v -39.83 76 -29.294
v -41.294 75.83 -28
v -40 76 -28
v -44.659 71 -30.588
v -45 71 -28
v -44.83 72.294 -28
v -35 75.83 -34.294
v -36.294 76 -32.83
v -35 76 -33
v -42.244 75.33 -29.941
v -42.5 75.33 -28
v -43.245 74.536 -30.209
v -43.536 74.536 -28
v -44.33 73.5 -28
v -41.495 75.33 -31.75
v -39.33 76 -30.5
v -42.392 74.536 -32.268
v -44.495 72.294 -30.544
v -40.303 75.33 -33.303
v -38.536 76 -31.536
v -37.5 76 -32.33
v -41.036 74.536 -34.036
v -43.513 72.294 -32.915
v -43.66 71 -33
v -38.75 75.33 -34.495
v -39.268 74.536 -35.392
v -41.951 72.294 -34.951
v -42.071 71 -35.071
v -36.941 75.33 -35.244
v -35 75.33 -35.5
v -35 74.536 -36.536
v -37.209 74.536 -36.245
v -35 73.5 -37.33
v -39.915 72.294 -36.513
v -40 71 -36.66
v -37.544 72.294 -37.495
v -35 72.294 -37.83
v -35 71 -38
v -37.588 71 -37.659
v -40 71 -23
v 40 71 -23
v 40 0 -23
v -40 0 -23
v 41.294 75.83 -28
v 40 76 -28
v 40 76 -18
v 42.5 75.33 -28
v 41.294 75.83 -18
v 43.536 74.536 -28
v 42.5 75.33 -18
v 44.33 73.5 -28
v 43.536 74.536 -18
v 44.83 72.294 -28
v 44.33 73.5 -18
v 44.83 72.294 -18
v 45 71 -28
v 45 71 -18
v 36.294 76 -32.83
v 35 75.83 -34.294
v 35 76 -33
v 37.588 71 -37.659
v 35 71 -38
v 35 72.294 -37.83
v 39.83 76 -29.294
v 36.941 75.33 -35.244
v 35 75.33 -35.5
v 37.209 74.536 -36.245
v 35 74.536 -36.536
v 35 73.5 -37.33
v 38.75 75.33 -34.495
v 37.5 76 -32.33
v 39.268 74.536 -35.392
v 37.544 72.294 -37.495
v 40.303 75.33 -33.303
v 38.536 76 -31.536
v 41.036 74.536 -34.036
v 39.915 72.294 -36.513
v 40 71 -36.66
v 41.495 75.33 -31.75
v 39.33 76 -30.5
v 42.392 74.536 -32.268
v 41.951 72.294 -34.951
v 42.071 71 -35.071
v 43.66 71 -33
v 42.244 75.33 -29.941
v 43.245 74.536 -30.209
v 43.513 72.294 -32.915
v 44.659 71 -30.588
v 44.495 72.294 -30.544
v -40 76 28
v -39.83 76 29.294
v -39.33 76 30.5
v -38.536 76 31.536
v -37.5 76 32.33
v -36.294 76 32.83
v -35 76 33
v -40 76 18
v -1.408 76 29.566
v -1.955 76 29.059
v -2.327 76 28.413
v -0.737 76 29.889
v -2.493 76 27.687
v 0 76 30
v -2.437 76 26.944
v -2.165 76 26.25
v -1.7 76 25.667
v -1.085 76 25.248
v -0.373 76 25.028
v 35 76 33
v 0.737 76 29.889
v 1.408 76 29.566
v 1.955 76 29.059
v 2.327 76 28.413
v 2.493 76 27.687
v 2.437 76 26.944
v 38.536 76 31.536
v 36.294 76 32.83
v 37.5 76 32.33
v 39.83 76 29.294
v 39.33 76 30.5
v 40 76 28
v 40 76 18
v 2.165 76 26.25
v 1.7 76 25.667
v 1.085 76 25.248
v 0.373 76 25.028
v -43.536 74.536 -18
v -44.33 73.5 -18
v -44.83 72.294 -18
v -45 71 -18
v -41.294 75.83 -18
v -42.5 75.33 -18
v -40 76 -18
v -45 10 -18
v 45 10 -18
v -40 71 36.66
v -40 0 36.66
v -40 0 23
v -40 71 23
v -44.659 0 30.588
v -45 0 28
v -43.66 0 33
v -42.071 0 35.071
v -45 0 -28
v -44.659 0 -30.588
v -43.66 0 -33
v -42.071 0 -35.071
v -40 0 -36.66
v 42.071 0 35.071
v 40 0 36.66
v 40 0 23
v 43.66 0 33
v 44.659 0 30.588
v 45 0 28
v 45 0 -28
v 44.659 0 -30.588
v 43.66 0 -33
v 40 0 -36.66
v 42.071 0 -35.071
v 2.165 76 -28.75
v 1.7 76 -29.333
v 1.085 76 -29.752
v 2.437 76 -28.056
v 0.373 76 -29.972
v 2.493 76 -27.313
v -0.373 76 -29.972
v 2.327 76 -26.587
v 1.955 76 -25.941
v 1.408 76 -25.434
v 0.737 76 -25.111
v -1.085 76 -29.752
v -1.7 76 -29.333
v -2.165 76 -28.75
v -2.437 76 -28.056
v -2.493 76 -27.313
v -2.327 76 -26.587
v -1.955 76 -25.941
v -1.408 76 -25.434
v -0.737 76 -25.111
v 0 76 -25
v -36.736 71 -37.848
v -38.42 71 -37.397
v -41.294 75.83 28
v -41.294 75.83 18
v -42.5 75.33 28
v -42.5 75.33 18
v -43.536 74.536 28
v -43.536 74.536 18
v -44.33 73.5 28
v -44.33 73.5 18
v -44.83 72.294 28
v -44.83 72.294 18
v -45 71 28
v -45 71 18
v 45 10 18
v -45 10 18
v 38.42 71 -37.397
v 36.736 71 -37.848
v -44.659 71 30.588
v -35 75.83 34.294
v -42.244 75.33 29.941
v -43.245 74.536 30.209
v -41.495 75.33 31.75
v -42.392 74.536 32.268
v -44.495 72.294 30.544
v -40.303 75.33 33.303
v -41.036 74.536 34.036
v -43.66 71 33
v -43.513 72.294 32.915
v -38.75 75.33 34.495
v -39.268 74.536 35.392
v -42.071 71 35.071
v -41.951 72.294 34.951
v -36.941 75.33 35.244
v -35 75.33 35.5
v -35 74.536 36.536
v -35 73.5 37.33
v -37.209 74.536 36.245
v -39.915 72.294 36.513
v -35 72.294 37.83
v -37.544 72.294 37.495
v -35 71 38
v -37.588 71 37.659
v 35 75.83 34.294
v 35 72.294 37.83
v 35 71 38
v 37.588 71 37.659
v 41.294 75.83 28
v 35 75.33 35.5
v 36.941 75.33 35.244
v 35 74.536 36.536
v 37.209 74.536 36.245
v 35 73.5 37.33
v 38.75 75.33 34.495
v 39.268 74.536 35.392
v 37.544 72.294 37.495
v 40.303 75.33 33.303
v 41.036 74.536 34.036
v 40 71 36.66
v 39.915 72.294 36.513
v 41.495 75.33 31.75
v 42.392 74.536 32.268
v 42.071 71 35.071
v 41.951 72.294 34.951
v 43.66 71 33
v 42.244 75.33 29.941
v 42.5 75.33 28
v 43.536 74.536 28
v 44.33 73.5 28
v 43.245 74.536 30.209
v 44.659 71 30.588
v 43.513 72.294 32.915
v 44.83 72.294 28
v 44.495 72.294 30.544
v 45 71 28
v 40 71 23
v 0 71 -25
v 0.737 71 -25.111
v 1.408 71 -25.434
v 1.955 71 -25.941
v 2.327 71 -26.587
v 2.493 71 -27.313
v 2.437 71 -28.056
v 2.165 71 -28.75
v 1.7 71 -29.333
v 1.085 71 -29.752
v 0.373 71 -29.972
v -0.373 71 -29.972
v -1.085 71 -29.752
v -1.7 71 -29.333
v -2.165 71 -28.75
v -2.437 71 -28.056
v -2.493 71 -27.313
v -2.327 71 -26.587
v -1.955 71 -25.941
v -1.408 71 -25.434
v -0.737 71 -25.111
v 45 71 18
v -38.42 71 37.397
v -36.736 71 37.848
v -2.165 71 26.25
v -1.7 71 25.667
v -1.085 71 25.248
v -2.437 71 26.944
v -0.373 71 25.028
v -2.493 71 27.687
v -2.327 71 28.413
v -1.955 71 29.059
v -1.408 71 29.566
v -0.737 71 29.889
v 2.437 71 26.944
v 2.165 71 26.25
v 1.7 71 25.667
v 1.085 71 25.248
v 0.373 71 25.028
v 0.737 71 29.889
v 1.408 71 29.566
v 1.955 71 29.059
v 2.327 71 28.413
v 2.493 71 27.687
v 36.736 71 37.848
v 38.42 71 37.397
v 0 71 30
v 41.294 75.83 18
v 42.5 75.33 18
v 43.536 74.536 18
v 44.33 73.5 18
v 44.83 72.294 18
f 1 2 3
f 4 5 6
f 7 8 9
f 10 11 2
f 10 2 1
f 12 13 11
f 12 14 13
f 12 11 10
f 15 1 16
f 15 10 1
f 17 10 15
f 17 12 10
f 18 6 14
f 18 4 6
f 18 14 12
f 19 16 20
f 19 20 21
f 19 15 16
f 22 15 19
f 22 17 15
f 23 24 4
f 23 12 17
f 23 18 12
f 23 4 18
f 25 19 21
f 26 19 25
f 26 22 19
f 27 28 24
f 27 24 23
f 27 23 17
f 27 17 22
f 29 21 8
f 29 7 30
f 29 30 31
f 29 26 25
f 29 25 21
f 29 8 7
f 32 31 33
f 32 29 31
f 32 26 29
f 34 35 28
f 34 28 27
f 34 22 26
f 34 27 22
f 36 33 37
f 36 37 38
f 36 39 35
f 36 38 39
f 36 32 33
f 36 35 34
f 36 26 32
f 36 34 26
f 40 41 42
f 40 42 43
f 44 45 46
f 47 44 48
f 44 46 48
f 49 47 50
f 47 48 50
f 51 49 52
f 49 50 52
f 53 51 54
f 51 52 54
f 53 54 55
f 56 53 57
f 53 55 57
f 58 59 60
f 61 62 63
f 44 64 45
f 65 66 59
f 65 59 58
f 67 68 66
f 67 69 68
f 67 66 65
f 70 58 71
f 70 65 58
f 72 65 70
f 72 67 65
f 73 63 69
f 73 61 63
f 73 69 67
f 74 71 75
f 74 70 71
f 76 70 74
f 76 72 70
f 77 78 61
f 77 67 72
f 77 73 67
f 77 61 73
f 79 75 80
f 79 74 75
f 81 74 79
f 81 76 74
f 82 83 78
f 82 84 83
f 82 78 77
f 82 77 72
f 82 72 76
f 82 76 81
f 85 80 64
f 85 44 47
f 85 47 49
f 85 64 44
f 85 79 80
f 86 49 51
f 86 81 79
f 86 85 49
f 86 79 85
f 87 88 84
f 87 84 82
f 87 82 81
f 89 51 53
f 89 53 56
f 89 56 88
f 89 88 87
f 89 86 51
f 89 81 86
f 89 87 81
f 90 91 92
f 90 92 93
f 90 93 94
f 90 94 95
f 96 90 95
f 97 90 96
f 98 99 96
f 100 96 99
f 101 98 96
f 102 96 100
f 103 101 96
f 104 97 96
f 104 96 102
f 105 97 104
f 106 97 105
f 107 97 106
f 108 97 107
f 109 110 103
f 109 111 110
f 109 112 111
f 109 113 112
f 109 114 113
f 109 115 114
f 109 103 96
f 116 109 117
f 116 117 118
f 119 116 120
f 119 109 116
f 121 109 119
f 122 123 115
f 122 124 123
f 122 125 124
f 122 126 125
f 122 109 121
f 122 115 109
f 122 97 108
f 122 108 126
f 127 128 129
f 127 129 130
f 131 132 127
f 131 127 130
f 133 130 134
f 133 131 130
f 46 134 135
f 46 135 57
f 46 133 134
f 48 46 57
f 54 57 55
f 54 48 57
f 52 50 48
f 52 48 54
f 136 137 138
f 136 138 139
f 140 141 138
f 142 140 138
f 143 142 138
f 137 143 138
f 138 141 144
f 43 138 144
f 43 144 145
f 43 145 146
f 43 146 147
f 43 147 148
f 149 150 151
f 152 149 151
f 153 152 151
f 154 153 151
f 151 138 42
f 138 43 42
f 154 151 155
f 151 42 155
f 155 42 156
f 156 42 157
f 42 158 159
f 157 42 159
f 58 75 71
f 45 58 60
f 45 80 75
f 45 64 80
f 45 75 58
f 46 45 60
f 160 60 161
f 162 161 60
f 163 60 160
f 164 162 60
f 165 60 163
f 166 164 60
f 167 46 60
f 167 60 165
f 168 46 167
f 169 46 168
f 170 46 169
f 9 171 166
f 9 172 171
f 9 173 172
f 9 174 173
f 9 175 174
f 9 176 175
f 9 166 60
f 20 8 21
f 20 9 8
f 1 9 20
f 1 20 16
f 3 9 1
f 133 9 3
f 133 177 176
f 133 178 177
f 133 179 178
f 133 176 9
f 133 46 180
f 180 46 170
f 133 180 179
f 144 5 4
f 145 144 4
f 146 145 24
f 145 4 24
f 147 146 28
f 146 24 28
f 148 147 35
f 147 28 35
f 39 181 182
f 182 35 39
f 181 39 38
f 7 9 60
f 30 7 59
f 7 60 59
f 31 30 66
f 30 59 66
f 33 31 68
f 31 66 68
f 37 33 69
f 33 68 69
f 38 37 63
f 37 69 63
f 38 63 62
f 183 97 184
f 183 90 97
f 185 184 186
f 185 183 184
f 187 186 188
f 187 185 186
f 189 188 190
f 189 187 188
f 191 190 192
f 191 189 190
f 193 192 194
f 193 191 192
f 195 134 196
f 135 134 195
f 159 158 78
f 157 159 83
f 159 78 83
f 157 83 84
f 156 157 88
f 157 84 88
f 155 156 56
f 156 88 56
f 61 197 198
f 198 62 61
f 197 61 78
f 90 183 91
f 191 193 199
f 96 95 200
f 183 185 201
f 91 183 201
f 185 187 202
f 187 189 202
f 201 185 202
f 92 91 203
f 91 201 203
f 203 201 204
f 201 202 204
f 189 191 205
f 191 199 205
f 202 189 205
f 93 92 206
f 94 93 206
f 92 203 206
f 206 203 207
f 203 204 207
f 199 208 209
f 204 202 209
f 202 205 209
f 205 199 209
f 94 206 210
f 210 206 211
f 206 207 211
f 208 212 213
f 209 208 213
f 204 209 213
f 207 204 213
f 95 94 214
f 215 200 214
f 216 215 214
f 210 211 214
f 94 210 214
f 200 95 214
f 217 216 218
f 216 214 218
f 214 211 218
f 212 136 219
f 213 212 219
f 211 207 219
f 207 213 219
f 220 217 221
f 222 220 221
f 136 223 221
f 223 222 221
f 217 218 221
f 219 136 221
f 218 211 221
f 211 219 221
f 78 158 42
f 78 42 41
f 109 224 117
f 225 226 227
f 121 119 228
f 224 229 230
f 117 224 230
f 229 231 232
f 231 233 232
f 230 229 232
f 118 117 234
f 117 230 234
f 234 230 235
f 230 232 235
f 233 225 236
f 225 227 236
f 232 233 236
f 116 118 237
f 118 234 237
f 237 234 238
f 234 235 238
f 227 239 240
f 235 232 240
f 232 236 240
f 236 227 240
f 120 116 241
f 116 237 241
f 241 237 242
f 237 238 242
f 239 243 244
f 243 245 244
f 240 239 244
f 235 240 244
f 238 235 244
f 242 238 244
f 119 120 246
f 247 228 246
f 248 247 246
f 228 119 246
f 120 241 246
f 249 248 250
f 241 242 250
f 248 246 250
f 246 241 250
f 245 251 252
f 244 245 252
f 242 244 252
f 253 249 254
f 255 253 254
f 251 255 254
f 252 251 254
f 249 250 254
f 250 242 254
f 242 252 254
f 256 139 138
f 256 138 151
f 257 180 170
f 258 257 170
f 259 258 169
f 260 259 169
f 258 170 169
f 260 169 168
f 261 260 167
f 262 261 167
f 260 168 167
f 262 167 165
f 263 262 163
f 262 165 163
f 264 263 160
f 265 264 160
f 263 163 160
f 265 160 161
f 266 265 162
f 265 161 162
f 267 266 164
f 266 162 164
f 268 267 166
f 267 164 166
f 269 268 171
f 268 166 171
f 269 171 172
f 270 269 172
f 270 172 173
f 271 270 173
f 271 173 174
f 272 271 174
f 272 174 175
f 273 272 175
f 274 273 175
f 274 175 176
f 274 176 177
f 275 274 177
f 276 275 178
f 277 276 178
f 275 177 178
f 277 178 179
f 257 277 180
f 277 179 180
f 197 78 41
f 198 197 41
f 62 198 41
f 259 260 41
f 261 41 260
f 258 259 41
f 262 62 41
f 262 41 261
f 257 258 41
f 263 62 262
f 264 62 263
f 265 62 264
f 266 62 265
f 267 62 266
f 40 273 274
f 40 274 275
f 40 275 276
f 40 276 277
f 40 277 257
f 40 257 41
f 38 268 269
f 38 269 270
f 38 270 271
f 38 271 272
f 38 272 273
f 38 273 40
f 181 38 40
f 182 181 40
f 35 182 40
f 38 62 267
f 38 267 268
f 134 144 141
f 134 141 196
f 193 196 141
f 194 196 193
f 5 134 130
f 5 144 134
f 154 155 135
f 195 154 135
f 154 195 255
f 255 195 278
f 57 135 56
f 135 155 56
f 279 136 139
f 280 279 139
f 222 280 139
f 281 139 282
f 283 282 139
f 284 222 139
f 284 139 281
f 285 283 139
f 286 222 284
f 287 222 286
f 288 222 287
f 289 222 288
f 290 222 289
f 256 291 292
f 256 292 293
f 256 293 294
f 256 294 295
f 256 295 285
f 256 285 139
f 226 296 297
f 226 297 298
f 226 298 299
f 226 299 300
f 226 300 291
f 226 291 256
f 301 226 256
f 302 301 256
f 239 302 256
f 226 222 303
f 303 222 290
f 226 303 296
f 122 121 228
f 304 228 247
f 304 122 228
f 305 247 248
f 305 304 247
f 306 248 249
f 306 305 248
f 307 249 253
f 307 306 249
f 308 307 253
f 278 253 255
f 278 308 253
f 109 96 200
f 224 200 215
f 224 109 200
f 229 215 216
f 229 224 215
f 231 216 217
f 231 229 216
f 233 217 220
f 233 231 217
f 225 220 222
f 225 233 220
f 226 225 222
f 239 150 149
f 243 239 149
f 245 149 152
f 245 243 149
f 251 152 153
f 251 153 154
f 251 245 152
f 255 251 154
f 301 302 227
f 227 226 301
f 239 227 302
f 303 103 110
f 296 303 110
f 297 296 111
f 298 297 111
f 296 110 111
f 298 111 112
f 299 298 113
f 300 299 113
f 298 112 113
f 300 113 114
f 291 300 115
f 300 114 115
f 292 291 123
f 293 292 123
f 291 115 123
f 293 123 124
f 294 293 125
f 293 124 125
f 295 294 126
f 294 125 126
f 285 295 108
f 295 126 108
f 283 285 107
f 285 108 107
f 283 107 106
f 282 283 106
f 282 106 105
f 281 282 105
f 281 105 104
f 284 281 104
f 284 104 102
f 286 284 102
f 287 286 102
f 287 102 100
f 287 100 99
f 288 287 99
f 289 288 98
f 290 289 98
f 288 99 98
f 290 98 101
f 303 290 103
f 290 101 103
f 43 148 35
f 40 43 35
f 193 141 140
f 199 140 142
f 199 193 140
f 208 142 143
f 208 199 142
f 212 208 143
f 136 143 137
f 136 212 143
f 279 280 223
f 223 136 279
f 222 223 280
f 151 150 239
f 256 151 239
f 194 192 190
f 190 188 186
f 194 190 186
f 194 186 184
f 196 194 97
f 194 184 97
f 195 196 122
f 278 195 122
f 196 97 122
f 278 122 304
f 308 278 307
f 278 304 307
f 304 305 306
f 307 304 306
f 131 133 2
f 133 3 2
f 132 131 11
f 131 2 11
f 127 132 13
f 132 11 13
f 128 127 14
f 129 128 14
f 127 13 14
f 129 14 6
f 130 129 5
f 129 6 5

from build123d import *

# Parameters (mm, degrees)
SKETCH1_W           = 90
SKETCH1_H           = 66
BOSS_EXTRUDE1_DEPTH = 76
SKETCH2_W           = 90
SKETCH2_H           = 36
CUT_EXTRUDE1_DEPTH  = 66
SKETCH3_W           = 90
SKETCH3_H           = 76
BOSS_EXTRUDE4_DEPTH = 5
SKETCH11_W          = 90
SKETCH11_H          = 76
BOSS_EXTRUDE5_DEPTH = 5
SKETCH12_W          = 80
SKETCH12_H          = 71
CUT_EXTRUDE9_DEPTH  = 15
SKETCH13_W          = 80
SKETCH13_H          = 71
CUT_EXTRUDE10_DEPTH = 15
SKETCH14_R          = 2.5
CUT_EXTRUDE11_DEPTH = 5
SKETCH15_R          = 2.5
CUT_EXTRUDE12_DEPTH = 5
FILLET1_R           = 10
FILLET2_R           = 5


with BuildPart() as part:
    # Sketch1 → Boss-Extrude1 (new body)
    with BuildSketch(Plane(origin=(0, 0, 0), x_dir=(1, 0, 0), z_dir=(0, 1, 0))):
        Rectangle(SKETCH1_W, SKETCH1_H)
    extrude(amount=BOSS_EXTRUDE1_DEPTH)

    # Sketch2 → Cut-Extrude1 (cut)
    with BuildSketch(Plane(origin=(0, 76, 0), x_dir=(1, 0, 0), z_dir=(0, 1, 0))):
        Rectangle(SKETCH2_W, SKETCH2_H)
    extrude(amount=-CUT_EXTRUDE1_DEPTH, mode=Mode.SUBTRACT)

    # Sketch3 → Boss-Extrude4 (add)
    with BuildSketch(Plane(origin=(0, 0, -33), x_dir=(-1, 0, 0), z_dir=(0, 0, -1))):
        with Locations((0, 38)):
            Rectangle(SKETCH3_W, SKETCH3_H)
    extrude(amount=BOSS_EXTRUDE4_DEPTH)

    # Sketch11 → Boss-Extrude5 (add)
    with BuildSketch(Plane.XY.offset(33)):
        with Locations((0, 38)):
            Rectangle(SKETCH11_W, SKETCH11_H)
    extrude(amount=BOSS_EXTRUDE5_DEPTH)

    # Sketch12 → Cut-Extrude9 (cut)
    with BuildSketch(Plane.XY.offset(38)):
        with Locations((0, 35.5)):
            Rectangle(SKETCH12_W, SKETCH12_H)
    extrude(amount=-CUT_EXTRUDE9_DEPTH, mode=Mode.SUBTRACT)

    # Sketch13 → Cut-Extrude10 (cut)
    with BuildSketch(Plane(origin=(0, 0, -38), x_dir=(-1, 0, 0), z_dir=(0, 0, -1))):
        with Locations((0, 35.5)):
            Rectangle(SKETCH13_W, SKETCH13_H)
    extrude(amount=-CUT_EXTRUDE10_DEPTH, mode=Mode.SUBTRACT)

    # Sketch14 → Cut-Extrude11 (cut)
    with BuildSketch(Plane(origin=(0, 76, 0), x_dir=(1, 0, 0), z_dir=(0, 1, 0))):
        with Locations(Location((0, 27.5, 0), (0, 0, 270))):
            Circle(SKETCH14_R)
    extrude(amount=-CUT_EXTRUDE11_DEPTH, mode=Mode.SUBTRACT)

    # Sketch15 → Cut-Extrude12 (cut)
    with BuildSketch(Plane(origin=(0, 76, 0), x_dir=(1, 0, 0), z_dir=(0, 1, 0))):
        with Locations(Location((0, -27.5, 0), (0, 0, 270))):
            Circle(SKETCH15_R)
    extrude(amount=-CUT_EXTRUDE12_DEPTH, mode=Mode.SUBTRACT)

    # Fillet1
    fillet1_edges = [part.edges().sort_by_distance(p)[0] for p in [
        (-45, 38, -38),
        (45, 38, -38),
        (-45, 38, 38),
        (45, 38, 38),
    ]]
    fillet(fillet1_edges, radius=FILLET1_R)

    # Fillet2
    fillet2_edges = [part.edges().sort_by_distance(p)[0] for p in [
        (45, 76, -23),
        (42.071067812, 76, -35.071067812),
        (-42.071067812, 76, -35.071067812),
        (45, 76, 23),
        (42.071067812, 76, 35.071067812),
        (0, 76, 38),
        (-42.071067812, 76, 35.071067812),
        (0, 76, -38),
        (-45, 76, -23),
        (-45, 76, 23),
    ]]
    fillet(fillet2_edges, radius=FILLET2_R - 0.0001)  # a hair under: the kernel refuses the full size


solid = part.part
